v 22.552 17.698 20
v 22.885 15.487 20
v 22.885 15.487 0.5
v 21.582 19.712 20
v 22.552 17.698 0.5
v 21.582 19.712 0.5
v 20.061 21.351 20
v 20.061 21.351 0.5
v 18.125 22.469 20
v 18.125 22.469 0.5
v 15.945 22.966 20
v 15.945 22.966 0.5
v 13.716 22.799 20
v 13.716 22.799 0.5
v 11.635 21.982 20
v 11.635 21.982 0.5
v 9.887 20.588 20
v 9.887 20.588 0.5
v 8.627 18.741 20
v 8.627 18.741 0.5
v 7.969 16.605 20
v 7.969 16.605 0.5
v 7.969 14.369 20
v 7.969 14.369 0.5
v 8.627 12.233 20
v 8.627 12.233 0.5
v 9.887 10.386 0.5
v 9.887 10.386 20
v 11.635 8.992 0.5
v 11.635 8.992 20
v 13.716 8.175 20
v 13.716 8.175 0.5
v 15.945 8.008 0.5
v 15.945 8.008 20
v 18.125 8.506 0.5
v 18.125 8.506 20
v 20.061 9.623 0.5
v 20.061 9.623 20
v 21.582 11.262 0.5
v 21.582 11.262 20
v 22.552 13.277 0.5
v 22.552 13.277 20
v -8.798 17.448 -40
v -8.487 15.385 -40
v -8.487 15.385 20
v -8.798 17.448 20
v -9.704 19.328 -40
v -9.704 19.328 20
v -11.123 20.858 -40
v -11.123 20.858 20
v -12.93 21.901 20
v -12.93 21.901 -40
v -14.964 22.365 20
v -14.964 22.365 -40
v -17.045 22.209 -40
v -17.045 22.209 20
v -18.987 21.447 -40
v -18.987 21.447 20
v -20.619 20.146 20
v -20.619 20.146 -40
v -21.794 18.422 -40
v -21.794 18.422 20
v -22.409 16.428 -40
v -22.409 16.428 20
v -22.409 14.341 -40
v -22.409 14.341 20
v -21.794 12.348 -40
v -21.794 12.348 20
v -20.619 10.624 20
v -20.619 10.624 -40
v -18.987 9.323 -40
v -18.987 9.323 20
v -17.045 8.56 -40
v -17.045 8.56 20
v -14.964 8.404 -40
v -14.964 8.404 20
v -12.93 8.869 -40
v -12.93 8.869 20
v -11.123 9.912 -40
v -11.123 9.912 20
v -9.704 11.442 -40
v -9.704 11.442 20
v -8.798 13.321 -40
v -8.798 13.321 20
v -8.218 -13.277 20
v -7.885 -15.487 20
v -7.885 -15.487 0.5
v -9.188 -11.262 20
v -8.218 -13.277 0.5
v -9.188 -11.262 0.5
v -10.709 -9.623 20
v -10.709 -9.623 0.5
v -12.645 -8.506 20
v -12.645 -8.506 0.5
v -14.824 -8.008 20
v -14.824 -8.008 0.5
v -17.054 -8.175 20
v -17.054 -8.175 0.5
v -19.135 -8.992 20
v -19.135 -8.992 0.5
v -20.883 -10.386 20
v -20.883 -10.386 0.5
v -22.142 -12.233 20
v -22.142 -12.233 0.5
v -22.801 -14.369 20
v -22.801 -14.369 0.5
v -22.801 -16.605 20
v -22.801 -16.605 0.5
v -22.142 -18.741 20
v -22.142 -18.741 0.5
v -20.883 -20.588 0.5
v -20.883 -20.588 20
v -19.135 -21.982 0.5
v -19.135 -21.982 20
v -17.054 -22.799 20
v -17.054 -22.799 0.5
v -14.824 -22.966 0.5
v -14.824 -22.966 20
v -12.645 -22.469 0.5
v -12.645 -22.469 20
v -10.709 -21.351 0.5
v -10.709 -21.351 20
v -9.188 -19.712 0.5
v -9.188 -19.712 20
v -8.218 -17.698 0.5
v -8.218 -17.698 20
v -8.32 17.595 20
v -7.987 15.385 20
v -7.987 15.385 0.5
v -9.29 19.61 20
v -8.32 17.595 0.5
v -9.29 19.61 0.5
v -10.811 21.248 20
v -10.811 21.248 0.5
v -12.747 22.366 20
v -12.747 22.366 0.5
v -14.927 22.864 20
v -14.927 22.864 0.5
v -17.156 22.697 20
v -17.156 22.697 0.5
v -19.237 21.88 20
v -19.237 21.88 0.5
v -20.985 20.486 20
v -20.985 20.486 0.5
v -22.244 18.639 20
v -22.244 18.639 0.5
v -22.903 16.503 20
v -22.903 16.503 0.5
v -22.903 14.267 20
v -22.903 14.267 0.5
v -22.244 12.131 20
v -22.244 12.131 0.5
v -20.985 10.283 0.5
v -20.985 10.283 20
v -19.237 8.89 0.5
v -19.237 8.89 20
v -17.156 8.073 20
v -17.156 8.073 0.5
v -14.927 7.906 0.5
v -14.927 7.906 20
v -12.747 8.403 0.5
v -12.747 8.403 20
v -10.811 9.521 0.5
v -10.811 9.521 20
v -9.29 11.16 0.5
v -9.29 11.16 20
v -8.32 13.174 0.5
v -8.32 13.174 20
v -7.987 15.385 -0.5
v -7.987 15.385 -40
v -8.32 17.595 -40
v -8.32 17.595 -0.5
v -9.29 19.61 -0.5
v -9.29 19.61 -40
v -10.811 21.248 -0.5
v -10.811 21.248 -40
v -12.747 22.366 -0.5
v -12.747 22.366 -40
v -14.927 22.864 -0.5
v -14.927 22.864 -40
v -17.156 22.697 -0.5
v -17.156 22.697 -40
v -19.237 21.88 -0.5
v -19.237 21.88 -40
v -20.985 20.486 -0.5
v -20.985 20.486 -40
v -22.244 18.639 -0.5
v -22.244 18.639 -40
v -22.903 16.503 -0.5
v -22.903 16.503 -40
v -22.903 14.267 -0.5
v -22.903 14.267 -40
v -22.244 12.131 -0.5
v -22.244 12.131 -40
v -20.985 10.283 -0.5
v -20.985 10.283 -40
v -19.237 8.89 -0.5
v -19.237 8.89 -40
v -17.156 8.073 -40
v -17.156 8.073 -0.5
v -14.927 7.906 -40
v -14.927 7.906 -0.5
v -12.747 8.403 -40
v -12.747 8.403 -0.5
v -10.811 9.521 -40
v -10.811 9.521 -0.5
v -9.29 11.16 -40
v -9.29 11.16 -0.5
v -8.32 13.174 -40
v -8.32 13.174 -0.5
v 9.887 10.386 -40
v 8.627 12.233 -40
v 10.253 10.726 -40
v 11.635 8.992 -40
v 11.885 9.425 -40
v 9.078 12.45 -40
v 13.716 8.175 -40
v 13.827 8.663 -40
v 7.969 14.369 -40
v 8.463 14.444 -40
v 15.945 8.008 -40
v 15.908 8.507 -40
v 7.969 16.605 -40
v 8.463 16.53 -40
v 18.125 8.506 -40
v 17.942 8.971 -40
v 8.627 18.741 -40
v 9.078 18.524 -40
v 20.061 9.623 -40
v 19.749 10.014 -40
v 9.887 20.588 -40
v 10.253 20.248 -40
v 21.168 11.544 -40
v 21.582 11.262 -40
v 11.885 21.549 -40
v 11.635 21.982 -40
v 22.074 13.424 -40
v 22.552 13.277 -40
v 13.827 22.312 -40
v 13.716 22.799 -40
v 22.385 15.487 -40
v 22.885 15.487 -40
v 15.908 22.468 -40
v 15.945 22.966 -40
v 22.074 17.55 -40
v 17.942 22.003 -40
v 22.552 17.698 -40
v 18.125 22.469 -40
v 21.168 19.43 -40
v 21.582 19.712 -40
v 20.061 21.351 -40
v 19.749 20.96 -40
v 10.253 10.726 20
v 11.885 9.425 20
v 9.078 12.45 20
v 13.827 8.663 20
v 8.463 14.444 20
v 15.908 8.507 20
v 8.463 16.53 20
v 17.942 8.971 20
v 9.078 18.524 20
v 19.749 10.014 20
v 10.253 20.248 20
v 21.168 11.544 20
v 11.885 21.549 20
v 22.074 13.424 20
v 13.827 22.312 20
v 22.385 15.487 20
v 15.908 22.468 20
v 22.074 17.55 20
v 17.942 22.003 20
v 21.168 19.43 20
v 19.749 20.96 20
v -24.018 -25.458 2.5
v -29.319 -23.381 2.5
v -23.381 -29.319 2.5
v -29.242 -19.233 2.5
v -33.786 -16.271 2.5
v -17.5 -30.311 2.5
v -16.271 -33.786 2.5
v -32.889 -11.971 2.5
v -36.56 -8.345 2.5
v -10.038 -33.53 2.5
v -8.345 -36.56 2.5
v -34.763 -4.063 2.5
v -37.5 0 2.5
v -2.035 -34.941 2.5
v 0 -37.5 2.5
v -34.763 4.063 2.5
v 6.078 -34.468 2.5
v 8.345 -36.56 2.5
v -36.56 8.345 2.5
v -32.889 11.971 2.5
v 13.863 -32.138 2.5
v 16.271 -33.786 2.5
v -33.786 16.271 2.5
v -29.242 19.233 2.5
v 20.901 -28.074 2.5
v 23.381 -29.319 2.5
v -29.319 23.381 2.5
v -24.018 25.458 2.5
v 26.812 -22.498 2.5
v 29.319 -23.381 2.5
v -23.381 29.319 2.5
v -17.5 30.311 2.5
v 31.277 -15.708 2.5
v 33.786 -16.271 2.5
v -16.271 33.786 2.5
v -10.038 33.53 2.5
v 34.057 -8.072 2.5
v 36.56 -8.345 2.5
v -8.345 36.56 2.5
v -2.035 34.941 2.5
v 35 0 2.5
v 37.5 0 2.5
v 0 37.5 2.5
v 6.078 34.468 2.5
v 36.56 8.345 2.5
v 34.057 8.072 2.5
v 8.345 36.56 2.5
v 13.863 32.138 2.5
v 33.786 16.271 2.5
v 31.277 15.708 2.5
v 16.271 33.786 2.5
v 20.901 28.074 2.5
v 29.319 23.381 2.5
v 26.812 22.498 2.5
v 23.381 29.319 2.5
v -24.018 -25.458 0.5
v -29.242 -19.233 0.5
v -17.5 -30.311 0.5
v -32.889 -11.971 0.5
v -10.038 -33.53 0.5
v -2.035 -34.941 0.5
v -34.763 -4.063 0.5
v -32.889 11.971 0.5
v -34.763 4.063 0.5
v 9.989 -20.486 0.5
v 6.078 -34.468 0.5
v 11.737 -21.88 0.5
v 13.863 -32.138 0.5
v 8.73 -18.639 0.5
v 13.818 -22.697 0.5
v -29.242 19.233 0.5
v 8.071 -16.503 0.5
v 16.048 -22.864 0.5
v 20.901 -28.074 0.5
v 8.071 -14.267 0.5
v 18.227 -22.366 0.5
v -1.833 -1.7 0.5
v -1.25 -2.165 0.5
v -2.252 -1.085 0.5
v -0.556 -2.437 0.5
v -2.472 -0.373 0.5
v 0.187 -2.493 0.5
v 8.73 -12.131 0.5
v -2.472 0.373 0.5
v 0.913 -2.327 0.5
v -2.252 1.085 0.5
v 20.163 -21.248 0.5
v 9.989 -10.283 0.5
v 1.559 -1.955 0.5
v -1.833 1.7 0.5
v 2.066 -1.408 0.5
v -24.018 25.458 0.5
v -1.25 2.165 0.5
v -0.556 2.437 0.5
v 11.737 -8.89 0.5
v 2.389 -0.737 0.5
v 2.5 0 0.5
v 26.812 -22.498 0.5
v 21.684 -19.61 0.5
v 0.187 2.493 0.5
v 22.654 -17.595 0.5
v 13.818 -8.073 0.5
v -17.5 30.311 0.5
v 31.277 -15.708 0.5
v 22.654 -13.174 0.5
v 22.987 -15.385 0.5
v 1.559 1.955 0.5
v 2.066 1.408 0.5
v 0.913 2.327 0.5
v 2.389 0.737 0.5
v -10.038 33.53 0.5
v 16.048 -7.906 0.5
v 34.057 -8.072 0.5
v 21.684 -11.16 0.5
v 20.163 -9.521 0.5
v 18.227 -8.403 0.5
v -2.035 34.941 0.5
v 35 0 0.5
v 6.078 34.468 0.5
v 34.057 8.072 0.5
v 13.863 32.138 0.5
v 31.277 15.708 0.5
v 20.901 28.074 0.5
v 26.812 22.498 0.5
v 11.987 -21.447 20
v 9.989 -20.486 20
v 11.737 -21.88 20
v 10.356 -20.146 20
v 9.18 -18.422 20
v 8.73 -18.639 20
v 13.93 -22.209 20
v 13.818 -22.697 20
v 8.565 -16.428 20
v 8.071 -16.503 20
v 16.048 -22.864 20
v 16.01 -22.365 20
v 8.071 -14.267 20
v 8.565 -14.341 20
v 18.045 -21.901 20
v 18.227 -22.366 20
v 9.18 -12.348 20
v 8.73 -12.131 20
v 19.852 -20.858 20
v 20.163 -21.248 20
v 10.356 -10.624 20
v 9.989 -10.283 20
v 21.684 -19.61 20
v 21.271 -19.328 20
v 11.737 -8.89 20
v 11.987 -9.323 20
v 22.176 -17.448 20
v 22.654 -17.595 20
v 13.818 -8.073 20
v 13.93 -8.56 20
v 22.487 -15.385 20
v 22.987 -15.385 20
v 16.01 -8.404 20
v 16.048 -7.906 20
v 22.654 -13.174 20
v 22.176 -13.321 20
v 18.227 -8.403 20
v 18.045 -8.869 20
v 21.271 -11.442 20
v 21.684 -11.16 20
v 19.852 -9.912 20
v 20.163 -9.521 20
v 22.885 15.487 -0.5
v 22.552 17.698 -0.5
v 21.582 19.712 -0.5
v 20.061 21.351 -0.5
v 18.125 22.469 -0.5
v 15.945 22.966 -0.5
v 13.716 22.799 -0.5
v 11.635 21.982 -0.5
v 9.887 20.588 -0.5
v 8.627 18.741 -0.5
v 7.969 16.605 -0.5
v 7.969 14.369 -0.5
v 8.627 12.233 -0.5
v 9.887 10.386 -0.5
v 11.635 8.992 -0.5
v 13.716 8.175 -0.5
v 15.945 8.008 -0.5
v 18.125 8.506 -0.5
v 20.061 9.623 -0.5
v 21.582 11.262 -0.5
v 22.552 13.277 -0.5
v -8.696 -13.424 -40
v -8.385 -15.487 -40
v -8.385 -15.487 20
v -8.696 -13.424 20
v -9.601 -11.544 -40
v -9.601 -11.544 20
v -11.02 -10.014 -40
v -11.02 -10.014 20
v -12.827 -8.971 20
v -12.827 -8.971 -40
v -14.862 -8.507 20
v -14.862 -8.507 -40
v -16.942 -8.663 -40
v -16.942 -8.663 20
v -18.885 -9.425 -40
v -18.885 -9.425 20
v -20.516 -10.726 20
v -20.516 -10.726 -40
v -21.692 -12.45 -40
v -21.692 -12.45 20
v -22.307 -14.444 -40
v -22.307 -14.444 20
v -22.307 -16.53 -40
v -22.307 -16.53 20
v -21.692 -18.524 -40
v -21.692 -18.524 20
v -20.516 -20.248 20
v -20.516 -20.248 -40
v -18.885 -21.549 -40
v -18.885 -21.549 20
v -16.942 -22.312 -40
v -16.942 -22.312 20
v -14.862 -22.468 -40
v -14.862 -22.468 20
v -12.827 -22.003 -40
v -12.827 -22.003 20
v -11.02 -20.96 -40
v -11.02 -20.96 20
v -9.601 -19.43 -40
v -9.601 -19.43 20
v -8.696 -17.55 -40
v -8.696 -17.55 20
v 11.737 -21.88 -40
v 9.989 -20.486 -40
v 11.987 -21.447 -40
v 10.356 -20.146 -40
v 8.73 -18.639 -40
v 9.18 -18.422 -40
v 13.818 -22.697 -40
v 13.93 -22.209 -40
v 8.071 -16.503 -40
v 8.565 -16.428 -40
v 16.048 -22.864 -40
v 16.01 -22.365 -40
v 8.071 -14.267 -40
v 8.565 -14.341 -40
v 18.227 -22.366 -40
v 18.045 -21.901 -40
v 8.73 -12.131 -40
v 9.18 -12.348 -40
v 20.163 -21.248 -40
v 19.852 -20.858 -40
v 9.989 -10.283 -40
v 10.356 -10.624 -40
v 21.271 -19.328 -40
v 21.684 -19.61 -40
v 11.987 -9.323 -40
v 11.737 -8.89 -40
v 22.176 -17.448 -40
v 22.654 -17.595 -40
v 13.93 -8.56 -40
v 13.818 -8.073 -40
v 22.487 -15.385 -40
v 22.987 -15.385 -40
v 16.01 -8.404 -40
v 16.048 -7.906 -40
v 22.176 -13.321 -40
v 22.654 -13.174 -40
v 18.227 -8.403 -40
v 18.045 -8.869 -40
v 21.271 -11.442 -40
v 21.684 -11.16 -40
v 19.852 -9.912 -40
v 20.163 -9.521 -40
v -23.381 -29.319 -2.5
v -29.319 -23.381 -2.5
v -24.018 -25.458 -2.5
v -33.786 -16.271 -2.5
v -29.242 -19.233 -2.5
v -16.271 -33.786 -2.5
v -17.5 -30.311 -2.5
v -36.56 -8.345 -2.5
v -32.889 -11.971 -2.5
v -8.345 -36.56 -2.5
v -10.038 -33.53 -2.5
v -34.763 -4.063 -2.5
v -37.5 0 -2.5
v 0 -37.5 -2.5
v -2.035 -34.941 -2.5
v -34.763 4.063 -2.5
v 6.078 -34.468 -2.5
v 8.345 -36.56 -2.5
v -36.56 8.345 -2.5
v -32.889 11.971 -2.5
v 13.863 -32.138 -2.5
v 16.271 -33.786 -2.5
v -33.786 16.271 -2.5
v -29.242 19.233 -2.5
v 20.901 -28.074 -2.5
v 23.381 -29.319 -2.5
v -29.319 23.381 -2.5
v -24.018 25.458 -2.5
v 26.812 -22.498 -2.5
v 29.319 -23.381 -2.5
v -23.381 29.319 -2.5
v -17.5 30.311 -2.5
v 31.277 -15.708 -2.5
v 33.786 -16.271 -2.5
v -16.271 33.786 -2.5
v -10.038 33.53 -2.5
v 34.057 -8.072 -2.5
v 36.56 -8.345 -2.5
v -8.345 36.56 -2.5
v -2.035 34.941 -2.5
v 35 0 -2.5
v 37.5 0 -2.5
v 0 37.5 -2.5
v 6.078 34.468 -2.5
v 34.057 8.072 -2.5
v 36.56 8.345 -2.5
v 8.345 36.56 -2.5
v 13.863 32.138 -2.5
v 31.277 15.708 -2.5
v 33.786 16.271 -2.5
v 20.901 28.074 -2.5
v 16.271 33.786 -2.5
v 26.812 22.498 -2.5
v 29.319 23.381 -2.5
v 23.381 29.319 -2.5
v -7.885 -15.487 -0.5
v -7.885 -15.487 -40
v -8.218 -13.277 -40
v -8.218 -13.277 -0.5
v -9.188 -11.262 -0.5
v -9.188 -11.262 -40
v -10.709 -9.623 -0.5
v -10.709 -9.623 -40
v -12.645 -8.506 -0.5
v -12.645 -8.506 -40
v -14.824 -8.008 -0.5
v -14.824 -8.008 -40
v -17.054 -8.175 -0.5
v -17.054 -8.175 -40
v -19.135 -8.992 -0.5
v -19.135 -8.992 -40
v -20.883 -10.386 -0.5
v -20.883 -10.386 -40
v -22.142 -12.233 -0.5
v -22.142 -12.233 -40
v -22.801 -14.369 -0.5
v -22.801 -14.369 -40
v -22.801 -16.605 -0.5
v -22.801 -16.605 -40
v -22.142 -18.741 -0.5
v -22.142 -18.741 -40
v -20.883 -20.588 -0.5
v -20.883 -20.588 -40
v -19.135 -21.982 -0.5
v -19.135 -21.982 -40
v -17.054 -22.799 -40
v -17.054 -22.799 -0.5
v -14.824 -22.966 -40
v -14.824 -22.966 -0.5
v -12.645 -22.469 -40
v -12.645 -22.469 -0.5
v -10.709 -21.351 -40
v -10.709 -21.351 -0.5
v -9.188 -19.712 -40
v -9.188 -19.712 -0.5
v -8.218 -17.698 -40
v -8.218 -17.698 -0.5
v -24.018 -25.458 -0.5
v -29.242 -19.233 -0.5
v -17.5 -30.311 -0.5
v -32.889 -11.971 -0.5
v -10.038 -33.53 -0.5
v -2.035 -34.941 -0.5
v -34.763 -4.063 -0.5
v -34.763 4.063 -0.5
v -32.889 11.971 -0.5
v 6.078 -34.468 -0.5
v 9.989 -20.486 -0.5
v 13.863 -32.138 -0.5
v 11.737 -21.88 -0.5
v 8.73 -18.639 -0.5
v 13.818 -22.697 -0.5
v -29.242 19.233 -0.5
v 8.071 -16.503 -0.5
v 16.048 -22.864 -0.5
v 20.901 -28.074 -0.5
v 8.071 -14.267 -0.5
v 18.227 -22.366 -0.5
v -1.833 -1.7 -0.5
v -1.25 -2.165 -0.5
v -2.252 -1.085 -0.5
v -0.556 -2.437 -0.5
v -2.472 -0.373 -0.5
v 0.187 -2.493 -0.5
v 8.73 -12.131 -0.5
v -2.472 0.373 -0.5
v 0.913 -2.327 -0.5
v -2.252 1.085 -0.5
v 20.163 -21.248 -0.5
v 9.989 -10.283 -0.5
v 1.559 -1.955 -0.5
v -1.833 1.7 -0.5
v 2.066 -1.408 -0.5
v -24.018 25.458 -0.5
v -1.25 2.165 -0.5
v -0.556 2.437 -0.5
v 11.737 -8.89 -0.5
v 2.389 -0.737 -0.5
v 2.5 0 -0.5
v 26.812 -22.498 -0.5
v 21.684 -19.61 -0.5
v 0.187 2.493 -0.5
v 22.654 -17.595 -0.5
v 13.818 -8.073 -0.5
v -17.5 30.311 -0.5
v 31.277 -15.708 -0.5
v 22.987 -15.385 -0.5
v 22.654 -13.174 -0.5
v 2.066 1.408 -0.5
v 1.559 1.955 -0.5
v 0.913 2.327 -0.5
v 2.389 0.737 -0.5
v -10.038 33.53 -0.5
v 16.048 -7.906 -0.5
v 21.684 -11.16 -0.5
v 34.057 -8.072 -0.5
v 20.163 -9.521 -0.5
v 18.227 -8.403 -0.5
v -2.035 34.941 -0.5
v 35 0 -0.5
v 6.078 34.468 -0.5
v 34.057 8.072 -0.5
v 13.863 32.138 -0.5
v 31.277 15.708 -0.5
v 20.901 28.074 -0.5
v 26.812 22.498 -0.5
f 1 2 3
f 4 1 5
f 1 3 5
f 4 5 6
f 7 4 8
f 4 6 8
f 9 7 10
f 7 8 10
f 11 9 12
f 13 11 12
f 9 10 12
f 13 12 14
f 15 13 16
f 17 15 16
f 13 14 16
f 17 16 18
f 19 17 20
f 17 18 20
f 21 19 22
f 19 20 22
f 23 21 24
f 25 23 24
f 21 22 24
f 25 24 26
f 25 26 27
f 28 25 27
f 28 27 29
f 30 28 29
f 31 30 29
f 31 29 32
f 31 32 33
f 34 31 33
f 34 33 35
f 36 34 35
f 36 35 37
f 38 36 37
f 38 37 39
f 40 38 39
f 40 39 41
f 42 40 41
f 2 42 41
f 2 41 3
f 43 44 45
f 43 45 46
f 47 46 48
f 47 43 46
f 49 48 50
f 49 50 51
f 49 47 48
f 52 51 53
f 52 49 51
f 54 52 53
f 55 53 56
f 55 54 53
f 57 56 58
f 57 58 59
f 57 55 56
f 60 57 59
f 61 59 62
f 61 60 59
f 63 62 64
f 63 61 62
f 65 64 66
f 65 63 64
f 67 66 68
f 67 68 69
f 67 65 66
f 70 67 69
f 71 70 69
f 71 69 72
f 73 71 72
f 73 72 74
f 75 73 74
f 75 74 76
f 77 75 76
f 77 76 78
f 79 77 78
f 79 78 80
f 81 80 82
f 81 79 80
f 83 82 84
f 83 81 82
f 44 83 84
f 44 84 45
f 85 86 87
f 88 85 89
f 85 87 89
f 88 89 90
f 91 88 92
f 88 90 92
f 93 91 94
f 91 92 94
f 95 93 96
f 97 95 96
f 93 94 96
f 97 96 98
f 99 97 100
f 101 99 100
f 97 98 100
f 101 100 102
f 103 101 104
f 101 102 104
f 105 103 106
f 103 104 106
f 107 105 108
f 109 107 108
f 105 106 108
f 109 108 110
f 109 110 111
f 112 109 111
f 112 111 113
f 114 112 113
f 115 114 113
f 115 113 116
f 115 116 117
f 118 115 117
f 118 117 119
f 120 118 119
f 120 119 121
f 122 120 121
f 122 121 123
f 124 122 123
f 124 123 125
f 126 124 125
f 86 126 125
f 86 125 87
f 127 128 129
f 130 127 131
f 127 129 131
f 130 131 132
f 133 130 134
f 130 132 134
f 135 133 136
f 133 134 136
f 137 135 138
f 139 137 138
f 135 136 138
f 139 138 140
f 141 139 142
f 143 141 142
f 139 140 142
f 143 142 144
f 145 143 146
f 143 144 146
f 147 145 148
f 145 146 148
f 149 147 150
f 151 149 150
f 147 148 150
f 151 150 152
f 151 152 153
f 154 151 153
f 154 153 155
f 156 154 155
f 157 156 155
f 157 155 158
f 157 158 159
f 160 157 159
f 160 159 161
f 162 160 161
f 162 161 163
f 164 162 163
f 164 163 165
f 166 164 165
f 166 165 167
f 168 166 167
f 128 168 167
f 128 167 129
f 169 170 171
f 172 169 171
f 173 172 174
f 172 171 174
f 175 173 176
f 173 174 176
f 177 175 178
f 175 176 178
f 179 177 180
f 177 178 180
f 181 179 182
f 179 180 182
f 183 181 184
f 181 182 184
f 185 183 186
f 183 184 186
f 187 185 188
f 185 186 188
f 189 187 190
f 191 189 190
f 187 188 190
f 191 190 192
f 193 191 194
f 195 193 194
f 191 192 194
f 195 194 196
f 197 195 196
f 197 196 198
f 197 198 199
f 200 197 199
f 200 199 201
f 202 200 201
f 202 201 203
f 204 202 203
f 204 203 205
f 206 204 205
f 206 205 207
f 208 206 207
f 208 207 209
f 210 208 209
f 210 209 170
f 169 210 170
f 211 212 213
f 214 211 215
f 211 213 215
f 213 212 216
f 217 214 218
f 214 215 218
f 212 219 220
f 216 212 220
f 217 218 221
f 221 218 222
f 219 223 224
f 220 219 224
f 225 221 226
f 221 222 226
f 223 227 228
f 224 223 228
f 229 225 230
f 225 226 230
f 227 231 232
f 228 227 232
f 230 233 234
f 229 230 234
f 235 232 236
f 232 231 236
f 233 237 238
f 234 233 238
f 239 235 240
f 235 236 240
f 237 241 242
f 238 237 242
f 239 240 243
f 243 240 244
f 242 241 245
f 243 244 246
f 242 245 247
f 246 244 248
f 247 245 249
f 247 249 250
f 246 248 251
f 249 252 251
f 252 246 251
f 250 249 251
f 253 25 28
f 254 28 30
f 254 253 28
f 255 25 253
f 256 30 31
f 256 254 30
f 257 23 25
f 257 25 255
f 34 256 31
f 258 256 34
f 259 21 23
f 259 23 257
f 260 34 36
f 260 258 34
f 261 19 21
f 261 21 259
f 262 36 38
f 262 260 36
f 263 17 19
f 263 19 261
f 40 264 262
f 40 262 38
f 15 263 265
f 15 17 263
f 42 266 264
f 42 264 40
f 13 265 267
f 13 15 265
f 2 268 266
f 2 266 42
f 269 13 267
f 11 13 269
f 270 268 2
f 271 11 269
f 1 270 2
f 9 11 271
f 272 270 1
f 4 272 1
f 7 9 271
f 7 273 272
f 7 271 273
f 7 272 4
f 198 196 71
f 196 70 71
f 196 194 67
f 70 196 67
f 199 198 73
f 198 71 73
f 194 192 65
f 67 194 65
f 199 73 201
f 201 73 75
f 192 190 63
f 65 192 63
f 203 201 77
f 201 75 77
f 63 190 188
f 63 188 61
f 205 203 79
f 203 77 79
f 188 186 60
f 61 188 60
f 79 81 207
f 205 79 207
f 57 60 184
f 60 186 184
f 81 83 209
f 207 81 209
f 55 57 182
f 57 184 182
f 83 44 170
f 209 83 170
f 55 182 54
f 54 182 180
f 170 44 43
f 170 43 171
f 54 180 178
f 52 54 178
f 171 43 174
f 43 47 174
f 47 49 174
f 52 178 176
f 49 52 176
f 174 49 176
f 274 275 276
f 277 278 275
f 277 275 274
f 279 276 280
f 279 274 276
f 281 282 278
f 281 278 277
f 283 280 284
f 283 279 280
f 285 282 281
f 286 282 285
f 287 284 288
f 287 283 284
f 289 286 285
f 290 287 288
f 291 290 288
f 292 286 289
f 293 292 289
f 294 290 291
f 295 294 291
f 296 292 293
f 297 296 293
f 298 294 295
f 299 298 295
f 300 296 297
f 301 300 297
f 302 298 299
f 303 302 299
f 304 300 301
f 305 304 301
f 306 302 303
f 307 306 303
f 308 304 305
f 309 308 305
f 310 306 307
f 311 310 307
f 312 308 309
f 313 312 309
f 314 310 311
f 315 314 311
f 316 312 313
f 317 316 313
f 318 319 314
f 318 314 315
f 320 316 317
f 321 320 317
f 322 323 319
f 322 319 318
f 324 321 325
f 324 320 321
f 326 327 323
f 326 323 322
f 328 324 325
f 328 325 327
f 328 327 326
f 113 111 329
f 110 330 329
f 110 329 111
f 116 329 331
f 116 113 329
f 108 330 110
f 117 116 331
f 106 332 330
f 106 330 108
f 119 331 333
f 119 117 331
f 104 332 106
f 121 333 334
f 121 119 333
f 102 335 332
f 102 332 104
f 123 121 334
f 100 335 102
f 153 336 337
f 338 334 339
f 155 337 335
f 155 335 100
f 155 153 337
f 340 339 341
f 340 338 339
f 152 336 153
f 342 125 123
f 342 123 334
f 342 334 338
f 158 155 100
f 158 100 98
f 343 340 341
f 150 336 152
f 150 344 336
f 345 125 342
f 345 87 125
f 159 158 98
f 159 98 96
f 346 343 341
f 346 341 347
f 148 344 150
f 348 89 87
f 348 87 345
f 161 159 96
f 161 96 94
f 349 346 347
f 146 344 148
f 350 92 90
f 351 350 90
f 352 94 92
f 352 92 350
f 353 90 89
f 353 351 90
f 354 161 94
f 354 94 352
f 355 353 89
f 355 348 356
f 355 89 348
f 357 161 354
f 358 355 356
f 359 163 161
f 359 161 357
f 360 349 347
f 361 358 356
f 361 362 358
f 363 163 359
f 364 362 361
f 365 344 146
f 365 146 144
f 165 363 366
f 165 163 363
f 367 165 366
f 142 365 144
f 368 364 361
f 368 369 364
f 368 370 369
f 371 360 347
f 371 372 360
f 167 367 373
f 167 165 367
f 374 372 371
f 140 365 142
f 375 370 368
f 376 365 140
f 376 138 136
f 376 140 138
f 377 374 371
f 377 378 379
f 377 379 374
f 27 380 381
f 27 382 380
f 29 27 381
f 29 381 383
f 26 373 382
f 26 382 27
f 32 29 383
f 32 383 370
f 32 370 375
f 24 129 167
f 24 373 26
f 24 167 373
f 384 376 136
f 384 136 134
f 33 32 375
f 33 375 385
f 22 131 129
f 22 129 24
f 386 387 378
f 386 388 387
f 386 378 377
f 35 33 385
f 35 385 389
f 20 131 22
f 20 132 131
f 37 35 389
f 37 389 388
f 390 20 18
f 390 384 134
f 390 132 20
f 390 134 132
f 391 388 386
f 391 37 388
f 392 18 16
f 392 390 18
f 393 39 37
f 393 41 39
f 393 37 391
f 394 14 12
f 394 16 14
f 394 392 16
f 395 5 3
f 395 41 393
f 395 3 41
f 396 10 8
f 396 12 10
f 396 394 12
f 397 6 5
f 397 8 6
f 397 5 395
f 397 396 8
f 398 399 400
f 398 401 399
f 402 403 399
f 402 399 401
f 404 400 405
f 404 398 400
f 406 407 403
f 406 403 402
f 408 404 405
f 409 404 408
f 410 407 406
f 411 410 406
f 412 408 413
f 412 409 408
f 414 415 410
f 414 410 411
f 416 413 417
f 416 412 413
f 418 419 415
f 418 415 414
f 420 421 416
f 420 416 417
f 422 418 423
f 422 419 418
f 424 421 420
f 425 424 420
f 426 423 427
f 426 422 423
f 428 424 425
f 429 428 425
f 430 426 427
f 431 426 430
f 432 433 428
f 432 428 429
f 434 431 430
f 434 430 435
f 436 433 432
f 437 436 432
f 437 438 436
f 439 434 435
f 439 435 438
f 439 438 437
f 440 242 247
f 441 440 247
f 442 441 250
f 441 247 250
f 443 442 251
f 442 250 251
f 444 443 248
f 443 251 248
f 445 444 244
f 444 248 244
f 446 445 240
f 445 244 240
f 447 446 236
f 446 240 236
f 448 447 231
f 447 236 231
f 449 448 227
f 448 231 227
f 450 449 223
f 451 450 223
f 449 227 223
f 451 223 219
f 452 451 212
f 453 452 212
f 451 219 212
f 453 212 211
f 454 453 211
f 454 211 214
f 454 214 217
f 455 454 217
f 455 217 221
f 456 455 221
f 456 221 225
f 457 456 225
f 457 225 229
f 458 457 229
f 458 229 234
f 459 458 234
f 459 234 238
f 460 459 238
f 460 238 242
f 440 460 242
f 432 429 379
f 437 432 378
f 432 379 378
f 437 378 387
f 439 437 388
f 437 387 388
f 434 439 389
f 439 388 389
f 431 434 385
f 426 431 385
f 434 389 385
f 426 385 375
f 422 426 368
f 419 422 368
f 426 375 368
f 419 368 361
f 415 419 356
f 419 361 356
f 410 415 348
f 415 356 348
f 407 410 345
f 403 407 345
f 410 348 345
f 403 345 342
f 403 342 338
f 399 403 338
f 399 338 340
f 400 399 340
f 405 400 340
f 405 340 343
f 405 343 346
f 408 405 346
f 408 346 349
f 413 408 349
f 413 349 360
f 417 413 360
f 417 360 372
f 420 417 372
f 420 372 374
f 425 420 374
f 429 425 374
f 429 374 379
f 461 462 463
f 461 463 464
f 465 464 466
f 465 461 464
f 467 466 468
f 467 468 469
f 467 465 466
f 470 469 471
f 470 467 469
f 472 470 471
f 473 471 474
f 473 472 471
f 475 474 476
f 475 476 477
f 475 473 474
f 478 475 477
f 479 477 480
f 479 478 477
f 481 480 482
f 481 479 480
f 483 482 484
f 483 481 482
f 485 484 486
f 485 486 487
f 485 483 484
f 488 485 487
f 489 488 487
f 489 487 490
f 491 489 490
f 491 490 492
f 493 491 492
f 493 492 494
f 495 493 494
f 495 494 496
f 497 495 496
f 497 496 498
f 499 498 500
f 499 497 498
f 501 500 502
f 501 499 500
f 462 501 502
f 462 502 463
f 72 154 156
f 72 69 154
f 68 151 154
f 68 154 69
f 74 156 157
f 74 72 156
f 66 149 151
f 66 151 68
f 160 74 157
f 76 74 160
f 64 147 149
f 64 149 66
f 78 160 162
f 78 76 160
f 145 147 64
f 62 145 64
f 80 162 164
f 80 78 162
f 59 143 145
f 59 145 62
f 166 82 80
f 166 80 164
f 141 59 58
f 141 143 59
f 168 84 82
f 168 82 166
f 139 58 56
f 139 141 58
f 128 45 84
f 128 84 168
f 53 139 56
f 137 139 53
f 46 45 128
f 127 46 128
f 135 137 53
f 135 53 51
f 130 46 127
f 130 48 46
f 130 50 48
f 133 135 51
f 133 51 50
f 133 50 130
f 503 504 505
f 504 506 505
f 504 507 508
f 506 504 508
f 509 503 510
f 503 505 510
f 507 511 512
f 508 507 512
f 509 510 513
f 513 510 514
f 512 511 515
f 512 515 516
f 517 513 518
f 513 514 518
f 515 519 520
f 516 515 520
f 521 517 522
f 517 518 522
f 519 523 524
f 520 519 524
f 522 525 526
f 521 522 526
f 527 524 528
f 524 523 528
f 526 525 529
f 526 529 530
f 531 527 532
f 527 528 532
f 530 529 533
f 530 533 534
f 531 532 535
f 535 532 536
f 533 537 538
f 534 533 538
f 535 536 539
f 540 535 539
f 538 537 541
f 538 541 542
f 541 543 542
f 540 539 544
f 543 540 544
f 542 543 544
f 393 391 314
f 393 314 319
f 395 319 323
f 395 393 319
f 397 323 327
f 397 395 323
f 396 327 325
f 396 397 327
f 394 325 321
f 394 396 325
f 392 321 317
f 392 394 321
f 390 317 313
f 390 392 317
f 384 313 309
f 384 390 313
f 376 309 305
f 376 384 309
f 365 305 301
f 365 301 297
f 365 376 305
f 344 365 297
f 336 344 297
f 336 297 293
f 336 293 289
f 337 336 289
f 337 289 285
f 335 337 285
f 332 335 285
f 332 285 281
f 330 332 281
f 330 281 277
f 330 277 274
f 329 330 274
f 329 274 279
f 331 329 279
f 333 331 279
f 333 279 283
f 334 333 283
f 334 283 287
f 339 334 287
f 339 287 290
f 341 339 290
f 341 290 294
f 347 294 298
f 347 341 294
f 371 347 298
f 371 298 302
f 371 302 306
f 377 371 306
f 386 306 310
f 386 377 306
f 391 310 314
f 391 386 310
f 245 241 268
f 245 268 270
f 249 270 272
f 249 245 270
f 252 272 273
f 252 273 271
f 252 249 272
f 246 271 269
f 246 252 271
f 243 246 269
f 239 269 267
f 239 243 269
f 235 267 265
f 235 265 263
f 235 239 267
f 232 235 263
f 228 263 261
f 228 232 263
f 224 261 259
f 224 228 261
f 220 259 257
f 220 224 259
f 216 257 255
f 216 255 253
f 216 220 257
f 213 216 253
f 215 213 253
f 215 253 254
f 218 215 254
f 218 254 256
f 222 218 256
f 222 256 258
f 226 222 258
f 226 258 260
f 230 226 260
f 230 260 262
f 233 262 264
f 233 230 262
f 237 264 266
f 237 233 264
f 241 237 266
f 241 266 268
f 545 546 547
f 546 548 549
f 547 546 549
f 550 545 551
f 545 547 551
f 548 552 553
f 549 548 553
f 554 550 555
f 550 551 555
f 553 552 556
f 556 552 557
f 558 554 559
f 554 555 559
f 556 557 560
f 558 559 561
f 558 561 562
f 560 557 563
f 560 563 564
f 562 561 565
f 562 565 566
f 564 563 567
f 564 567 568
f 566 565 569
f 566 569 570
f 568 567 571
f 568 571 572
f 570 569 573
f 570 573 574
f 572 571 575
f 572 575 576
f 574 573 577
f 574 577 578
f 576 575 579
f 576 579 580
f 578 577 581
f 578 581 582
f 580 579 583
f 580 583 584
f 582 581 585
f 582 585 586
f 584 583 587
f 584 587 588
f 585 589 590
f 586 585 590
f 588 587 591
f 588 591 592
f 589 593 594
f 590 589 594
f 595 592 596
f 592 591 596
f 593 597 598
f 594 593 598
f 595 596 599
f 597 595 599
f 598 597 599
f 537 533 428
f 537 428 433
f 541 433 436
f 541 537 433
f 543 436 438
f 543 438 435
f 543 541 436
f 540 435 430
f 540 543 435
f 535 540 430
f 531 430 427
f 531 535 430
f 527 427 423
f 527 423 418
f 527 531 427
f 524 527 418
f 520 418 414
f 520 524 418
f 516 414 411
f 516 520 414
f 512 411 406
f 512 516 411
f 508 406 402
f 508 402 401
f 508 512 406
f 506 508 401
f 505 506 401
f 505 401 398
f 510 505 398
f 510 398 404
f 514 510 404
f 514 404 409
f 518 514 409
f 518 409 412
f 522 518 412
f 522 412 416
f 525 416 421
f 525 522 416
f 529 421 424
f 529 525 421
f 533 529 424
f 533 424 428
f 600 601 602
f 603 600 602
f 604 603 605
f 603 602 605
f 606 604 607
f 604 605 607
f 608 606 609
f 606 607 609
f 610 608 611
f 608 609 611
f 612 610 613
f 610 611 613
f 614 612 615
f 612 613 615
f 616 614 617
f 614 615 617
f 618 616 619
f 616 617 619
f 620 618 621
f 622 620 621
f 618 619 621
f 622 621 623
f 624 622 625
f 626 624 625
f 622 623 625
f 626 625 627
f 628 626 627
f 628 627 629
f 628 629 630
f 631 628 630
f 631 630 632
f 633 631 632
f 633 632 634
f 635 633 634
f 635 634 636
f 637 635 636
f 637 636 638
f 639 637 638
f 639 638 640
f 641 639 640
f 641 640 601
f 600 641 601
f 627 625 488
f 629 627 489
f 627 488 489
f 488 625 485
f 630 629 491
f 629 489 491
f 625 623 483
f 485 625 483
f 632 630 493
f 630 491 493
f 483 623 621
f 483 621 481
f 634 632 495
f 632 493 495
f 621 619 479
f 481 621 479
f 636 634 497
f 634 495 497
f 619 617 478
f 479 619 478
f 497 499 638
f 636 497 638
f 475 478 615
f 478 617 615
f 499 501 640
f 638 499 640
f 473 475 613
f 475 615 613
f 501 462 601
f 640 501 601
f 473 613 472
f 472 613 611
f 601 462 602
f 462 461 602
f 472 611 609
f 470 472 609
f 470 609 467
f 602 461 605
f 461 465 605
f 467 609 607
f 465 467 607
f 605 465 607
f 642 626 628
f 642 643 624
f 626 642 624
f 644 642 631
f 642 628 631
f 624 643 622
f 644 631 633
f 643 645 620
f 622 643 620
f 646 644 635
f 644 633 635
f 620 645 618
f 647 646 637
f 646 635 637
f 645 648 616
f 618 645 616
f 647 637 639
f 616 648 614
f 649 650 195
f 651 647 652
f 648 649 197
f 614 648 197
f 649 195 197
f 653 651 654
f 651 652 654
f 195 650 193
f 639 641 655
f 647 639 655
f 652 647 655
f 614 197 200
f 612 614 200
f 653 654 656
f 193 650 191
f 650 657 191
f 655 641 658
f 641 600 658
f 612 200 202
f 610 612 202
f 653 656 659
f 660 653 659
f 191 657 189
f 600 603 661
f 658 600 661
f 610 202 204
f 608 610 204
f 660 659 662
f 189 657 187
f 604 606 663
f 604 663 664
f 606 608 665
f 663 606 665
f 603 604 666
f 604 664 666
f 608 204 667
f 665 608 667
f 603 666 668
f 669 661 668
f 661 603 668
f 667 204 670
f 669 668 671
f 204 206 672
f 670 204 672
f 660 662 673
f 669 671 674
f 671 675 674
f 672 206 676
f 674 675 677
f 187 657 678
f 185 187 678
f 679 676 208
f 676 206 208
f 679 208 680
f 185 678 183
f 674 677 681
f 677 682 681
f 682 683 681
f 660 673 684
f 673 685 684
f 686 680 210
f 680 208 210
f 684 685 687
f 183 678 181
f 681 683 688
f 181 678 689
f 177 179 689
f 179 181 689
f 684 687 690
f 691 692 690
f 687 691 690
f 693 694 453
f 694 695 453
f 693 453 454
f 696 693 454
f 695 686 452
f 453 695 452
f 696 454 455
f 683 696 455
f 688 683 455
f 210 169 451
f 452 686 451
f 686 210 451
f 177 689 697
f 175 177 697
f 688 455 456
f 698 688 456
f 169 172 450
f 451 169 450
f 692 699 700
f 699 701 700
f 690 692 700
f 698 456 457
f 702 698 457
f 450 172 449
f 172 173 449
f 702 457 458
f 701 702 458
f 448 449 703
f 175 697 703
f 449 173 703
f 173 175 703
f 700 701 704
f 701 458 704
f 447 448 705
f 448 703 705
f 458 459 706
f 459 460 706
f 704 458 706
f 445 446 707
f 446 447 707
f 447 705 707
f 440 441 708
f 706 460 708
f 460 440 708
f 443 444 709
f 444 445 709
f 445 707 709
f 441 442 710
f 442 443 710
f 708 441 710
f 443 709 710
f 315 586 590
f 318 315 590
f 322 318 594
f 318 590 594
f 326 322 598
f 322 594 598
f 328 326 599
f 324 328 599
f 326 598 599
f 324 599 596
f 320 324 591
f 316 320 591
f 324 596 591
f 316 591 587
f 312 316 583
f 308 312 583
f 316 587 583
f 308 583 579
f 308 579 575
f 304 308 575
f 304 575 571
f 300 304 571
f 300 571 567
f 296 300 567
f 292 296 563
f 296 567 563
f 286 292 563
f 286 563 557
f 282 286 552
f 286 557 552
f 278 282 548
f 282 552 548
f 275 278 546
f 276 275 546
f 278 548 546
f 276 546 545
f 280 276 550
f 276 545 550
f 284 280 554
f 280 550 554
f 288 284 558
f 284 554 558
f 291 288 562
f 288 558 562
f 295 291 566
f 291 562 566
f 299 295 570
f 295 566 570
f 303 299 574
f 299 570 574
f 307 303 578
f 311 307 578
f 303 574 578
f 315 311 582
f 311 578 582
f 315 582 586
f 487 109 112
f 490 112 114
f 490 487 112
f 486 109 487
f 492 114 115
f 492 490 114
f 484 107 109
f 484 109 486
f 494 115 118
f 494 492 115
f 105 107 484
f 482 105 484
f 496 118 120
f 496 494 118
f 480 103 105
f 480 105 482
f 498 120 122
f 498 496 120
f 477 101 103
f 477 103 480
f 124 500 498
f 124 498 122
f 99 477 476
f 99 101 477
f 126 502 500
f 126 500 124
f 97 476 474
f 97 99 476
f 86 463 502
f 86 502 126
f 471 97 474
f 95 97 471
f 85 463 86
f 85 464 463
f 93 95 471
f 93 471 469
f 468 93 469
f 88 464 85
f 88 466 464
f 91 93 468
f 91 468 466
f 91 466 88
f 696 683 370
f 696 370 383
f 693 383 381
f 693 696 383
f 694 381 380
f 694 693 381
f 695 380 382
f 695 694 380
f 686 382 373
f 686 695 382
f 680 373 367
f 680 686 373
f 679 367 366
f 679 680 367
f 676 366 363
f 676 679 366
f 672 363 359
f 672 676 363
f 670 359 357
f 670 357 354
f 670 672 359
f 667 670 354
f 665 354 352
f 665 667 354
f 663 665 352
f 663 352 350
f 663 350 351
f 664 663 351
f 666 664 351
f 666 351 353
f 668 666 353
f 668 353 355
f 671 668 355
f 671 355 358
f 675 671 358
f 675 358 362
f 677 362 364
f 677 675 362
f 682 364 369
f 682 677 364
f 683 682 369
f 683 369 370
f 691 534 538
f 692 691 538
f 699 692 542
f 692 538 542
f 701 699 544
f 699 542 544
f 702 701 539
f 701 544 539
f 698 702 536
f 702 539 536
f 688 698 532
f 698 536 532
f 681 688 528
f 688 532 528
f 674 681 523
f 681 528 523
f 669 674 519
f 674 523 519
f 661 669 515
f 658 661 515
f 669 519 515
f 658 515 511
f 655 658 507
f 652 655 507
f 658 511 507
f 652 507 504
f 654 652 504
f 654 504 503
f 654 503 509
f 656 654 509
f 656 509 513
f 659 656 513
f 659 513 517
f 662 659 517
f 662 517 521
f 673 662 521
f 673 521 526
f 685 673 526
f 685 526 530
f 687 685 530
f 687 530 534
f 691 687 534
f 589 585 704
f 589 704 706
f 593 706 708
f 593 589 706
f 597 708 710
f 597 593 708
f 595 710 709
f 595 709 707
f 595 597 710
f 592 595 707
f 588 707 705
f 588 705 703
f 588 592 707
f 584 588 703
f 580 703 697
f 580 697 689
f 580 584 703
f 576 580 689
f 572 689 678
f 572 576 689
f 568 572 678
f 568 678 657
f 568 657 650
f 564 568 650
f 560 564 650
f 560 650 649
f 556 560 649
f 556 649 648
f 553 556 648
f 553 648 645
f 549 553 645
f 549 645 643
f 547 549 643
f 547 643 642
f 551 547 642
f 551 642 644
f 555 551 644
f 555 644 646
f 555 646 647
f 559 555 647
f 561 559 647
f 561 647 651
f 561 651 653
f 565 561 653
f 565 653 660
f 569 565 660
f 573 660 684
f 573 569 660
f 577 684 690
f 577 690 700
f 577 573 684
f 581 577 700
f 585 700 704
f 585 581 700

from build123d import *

# Parameters (mm, degrees)
BOSS_EXTRUDE1_DEPTH      = 2.5
BOSS_EXTRUDE1_DEPTH_BACK = 2.5
SKETCH1_R                = 37.5
SKETCH1_R_2              = 35
BOSS_EXTRUDE2_DEPTH      = 0.5
BOSS_EXTRUDE2_DEPTH_BACK = 0.5
SKETCH1_3_R              = 35
SKETCH1_3_R_2            = 7.5
SKETCH1_3_R_3            = 2.5
BOSS_EXTRUDE3_DEPTH      = 20
BOSS_EXTRUDE3_DEPTH_BACK = 40
SKETCH1_4_R              = 7.5
SKETCH1_4_R_2            = 7


with BuildPart() as part:
    # Sketch1 → Boss-Extrude1 (new, two sides: drawn at the far end of the back side and taken through both)
    with BuildSketch(Plane.XY.offset(-BOSS_EXTRUDE1_DEPTH_BACK)):
        Circle(SKETCH1_R)
        Circle(SKETCH1_R_2, mode=Mode.SUBTRACT)
    extrude(amount=BOSS_EXTRUDE1_DEPTH + BOSS_EXTRUDE1_DEPTH_BACK)

    # Sketch1<3> → Boss-Extrude2 (add, two sides: drawn at the far end of the back side and taken through both)
    with BuildSketch(Plane.XY.offset(-BOSS_EXTRUDE2_DEPTH_BACK)):
        Circle(SKETCH1_3_R)
        with Locations((-15.384748909, -15.487184505)):
            Circle(SKETCH1_3_R_2, mode=Mode.SUBTRACT)
        with Locations((15.487184505, -15.384748909)):
            Circle(SKETCH1_3_R_2, mode=Mode.SUBTRACT)
        with Locations((15.384748909, 15.487184505)):
            Circle(SKETCH1_3_R_2, mode=Mode.SUBTRACT)
        with Locations((-15.487184505, 15.384748909)):
            Circle(SKETCH1_3_R_2, mode=Mode.SUBTRACT)
        Circle(SKETCH1_3_R_3, mode=Mode.SUBTRACT)
    extrude(amount=BOSS_EXTRUDE2_DEPTH + BOSS_EXTRUDE2_DEPTH_BACK)

    # Sketch1<4> → Boss-Extrude3 (add, two sides: drawn at the far end of the back side and taken through both)
    # profile 1 of 4: a face of its own
    with BuildSketch(Plane.XY.offset(-BOSS_EXTRUDE3_DEPTH_BACK)):
        with Locations((-15.487184505, 15.384748909)):
            Circle(SKETCH1_4_R)
        with Locations((-15.487184505, 15.384748909)):
            Circle(SKETCH1_4_R_2, mode=Mode.SUBTRACT)
    # profile 2 of 4: a face of its own
    with BuildSketch(Plane.XY.offset(-BOSS_EXTRUDE3_DEPTH_BACK)):
        with Locations((15.384748909, 15.487184505)):
            Circle(SKETCH1_4_R)
        with Locations((15.384748909, 15.487184505)):
            Circle(SKETCH1_4_R_2, mode=Mode.SUBTRACT)
    # profile 3 of 4: a face of its own
    with BuildSketch(Plane.XY.offset(-BOSS_EXTRUDE3_DEPTH_BACK)):
        with Locations((15.487184505, -15.384748909)):
            Circle(SKETCH1_4_R)
        with Locations((15.487184505, -15.384748909)):
            Circle(SKETCH1_4_R_2, mode=Mode.SUBTRACT)
    # profile 4 of 4: a face of its own
    with BuildSketch(Plane.XY.offset(-BOSS_EXTRUDE3_DEPTH_BACK)):
        with Locations((-15.384748909, -15.487184505)):
            Circle(SKETCH1_4_R)
        with Locations((-15.384748909, -15.487184505)):
            Circle(SKETCH1_4_R_2, mode=Mode.SUBTRACT)
    extrude(amount=BOSS_EXTRUDE3_DEPTH + BOSS_EXTRUDE3_DEPTH_BACK)


solid = part.part
